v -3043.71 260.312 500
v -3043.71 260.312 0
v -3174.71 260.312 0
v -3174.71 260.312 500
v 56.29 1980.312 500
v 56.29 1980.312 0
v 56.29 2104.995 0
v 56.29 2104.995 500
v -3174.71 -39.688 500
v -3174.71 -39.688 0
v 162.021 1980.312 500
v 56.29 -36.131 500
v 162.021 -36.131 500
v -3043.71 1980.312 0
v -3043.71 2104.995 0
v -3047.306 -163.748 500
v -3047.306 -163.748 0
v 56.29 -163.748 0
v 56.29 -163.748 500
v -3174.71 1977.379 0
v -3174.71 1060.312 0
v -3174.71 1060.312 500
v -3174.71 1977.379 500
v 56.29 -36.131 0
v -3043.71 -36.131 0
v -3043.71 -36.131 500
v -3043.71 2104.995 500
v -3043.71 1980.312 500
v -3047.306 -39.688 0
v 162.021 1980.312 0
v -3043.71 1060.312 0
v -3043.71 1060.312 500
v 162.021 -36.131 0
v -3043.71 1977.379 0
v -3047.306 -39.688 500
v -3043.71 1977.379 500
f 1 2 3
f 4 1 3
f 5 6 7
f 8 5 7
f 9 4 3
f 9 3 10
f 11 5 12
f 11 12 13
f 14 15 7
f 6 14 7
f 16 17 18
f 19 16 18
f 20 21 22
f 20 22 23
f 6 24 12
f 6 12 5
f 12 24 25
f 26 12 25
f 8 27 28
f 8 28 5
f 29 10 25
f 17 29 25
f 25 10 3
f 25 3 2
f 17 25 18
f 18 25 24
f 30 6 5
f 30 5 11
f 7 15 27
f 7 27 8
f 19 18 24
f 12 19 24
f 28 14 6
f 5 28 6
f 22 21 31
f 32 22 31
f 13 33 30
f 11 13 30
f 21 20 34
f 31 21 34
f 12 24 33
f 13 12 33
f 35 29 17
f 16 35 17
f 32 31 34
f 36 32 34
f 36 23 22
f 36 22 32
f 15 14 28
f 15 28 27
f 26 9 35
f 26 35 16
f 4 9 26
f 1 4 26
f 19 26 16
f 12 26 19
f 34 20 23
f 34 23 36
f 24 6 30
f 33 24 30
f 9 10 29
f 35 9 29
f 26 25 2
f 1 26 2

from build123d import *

# Parameters (mm, degrees)
F0_W     = 3100
F0_H     = 124.6838192642
F1_DEPTH = 500
F0_W_2   = 105.7304888964
F0_H_2   = 2016.4431114495
F0_H_3   = 3.5568885505
F0_W_3   = 3.5965681076
F0_W_4   = 131
F0_H_4   = 917.06693694


with BuildPart() as f1:
    # F0 (on Top) → F1 (new body)
    with BuildSketch(Plane.XY):
        with Locations((-1493.7097969055, 2042.6535794884)):
            Rectangle(F0_W, F0_H)
    extrude(amount=F1_DEPTH)


with BuildPart() as f1b:
    # F0 (on Top) → F1, piece 2 (new body)
    with BuildSketch(Plane.XY):
        with Locations((109.1554475427, 972.0901141316)):
            Rectangle(F0_W_2, F0_H_2)
    extrude(amount=F1_DEPTH)


with BuildPart() as f1c:
    # F0 (on Top) → F1, piece 3 (new body)
    with BuildSketch(Plane.XY):
        Polygon((56.2902030945, -163.7482494116), (56.2902030945, -39.6883301437), (-3043.7097969055, -39.6883301437), (-3047.3063650131, -39.6883301437), (-3047.3063650131, -163.7482494116), align=None)
        with Locations((-1493.7097969055, -37.9098858684)):
            Rectangle(F0_W, F0_H_3)
        with Locations((-3045.5080809593, -37.9098858684)):
            Rectangle(F0_W_3, F0_H_3)
        Polygon((-3047.3063650131, -36.1314415932), (-3043.7097969055, -36.1314415932), (-3043.7097969055, 260.3116698563), (-3174.7097969055, 260.3116698563), (-3174.7097969055, -39.6883301437), (-3047.3063650131, -39.6883301437), align=None)
    extrude(amount=F1_DEPTH)


with BuildPart() as f1d:
    # F0 (on Top) → F1, piece 4 (new body)
    with BuildSketch(Plane.XY):
        with Locations((-3109.2097969055, 1518.8451383263)):
            Rectangle(F0_W_4, F0_H_4)
    extrude(amount=F1_DEPTH)


solid = Compound([f1.part, f1b.part, f1c.part, f1d.part])
